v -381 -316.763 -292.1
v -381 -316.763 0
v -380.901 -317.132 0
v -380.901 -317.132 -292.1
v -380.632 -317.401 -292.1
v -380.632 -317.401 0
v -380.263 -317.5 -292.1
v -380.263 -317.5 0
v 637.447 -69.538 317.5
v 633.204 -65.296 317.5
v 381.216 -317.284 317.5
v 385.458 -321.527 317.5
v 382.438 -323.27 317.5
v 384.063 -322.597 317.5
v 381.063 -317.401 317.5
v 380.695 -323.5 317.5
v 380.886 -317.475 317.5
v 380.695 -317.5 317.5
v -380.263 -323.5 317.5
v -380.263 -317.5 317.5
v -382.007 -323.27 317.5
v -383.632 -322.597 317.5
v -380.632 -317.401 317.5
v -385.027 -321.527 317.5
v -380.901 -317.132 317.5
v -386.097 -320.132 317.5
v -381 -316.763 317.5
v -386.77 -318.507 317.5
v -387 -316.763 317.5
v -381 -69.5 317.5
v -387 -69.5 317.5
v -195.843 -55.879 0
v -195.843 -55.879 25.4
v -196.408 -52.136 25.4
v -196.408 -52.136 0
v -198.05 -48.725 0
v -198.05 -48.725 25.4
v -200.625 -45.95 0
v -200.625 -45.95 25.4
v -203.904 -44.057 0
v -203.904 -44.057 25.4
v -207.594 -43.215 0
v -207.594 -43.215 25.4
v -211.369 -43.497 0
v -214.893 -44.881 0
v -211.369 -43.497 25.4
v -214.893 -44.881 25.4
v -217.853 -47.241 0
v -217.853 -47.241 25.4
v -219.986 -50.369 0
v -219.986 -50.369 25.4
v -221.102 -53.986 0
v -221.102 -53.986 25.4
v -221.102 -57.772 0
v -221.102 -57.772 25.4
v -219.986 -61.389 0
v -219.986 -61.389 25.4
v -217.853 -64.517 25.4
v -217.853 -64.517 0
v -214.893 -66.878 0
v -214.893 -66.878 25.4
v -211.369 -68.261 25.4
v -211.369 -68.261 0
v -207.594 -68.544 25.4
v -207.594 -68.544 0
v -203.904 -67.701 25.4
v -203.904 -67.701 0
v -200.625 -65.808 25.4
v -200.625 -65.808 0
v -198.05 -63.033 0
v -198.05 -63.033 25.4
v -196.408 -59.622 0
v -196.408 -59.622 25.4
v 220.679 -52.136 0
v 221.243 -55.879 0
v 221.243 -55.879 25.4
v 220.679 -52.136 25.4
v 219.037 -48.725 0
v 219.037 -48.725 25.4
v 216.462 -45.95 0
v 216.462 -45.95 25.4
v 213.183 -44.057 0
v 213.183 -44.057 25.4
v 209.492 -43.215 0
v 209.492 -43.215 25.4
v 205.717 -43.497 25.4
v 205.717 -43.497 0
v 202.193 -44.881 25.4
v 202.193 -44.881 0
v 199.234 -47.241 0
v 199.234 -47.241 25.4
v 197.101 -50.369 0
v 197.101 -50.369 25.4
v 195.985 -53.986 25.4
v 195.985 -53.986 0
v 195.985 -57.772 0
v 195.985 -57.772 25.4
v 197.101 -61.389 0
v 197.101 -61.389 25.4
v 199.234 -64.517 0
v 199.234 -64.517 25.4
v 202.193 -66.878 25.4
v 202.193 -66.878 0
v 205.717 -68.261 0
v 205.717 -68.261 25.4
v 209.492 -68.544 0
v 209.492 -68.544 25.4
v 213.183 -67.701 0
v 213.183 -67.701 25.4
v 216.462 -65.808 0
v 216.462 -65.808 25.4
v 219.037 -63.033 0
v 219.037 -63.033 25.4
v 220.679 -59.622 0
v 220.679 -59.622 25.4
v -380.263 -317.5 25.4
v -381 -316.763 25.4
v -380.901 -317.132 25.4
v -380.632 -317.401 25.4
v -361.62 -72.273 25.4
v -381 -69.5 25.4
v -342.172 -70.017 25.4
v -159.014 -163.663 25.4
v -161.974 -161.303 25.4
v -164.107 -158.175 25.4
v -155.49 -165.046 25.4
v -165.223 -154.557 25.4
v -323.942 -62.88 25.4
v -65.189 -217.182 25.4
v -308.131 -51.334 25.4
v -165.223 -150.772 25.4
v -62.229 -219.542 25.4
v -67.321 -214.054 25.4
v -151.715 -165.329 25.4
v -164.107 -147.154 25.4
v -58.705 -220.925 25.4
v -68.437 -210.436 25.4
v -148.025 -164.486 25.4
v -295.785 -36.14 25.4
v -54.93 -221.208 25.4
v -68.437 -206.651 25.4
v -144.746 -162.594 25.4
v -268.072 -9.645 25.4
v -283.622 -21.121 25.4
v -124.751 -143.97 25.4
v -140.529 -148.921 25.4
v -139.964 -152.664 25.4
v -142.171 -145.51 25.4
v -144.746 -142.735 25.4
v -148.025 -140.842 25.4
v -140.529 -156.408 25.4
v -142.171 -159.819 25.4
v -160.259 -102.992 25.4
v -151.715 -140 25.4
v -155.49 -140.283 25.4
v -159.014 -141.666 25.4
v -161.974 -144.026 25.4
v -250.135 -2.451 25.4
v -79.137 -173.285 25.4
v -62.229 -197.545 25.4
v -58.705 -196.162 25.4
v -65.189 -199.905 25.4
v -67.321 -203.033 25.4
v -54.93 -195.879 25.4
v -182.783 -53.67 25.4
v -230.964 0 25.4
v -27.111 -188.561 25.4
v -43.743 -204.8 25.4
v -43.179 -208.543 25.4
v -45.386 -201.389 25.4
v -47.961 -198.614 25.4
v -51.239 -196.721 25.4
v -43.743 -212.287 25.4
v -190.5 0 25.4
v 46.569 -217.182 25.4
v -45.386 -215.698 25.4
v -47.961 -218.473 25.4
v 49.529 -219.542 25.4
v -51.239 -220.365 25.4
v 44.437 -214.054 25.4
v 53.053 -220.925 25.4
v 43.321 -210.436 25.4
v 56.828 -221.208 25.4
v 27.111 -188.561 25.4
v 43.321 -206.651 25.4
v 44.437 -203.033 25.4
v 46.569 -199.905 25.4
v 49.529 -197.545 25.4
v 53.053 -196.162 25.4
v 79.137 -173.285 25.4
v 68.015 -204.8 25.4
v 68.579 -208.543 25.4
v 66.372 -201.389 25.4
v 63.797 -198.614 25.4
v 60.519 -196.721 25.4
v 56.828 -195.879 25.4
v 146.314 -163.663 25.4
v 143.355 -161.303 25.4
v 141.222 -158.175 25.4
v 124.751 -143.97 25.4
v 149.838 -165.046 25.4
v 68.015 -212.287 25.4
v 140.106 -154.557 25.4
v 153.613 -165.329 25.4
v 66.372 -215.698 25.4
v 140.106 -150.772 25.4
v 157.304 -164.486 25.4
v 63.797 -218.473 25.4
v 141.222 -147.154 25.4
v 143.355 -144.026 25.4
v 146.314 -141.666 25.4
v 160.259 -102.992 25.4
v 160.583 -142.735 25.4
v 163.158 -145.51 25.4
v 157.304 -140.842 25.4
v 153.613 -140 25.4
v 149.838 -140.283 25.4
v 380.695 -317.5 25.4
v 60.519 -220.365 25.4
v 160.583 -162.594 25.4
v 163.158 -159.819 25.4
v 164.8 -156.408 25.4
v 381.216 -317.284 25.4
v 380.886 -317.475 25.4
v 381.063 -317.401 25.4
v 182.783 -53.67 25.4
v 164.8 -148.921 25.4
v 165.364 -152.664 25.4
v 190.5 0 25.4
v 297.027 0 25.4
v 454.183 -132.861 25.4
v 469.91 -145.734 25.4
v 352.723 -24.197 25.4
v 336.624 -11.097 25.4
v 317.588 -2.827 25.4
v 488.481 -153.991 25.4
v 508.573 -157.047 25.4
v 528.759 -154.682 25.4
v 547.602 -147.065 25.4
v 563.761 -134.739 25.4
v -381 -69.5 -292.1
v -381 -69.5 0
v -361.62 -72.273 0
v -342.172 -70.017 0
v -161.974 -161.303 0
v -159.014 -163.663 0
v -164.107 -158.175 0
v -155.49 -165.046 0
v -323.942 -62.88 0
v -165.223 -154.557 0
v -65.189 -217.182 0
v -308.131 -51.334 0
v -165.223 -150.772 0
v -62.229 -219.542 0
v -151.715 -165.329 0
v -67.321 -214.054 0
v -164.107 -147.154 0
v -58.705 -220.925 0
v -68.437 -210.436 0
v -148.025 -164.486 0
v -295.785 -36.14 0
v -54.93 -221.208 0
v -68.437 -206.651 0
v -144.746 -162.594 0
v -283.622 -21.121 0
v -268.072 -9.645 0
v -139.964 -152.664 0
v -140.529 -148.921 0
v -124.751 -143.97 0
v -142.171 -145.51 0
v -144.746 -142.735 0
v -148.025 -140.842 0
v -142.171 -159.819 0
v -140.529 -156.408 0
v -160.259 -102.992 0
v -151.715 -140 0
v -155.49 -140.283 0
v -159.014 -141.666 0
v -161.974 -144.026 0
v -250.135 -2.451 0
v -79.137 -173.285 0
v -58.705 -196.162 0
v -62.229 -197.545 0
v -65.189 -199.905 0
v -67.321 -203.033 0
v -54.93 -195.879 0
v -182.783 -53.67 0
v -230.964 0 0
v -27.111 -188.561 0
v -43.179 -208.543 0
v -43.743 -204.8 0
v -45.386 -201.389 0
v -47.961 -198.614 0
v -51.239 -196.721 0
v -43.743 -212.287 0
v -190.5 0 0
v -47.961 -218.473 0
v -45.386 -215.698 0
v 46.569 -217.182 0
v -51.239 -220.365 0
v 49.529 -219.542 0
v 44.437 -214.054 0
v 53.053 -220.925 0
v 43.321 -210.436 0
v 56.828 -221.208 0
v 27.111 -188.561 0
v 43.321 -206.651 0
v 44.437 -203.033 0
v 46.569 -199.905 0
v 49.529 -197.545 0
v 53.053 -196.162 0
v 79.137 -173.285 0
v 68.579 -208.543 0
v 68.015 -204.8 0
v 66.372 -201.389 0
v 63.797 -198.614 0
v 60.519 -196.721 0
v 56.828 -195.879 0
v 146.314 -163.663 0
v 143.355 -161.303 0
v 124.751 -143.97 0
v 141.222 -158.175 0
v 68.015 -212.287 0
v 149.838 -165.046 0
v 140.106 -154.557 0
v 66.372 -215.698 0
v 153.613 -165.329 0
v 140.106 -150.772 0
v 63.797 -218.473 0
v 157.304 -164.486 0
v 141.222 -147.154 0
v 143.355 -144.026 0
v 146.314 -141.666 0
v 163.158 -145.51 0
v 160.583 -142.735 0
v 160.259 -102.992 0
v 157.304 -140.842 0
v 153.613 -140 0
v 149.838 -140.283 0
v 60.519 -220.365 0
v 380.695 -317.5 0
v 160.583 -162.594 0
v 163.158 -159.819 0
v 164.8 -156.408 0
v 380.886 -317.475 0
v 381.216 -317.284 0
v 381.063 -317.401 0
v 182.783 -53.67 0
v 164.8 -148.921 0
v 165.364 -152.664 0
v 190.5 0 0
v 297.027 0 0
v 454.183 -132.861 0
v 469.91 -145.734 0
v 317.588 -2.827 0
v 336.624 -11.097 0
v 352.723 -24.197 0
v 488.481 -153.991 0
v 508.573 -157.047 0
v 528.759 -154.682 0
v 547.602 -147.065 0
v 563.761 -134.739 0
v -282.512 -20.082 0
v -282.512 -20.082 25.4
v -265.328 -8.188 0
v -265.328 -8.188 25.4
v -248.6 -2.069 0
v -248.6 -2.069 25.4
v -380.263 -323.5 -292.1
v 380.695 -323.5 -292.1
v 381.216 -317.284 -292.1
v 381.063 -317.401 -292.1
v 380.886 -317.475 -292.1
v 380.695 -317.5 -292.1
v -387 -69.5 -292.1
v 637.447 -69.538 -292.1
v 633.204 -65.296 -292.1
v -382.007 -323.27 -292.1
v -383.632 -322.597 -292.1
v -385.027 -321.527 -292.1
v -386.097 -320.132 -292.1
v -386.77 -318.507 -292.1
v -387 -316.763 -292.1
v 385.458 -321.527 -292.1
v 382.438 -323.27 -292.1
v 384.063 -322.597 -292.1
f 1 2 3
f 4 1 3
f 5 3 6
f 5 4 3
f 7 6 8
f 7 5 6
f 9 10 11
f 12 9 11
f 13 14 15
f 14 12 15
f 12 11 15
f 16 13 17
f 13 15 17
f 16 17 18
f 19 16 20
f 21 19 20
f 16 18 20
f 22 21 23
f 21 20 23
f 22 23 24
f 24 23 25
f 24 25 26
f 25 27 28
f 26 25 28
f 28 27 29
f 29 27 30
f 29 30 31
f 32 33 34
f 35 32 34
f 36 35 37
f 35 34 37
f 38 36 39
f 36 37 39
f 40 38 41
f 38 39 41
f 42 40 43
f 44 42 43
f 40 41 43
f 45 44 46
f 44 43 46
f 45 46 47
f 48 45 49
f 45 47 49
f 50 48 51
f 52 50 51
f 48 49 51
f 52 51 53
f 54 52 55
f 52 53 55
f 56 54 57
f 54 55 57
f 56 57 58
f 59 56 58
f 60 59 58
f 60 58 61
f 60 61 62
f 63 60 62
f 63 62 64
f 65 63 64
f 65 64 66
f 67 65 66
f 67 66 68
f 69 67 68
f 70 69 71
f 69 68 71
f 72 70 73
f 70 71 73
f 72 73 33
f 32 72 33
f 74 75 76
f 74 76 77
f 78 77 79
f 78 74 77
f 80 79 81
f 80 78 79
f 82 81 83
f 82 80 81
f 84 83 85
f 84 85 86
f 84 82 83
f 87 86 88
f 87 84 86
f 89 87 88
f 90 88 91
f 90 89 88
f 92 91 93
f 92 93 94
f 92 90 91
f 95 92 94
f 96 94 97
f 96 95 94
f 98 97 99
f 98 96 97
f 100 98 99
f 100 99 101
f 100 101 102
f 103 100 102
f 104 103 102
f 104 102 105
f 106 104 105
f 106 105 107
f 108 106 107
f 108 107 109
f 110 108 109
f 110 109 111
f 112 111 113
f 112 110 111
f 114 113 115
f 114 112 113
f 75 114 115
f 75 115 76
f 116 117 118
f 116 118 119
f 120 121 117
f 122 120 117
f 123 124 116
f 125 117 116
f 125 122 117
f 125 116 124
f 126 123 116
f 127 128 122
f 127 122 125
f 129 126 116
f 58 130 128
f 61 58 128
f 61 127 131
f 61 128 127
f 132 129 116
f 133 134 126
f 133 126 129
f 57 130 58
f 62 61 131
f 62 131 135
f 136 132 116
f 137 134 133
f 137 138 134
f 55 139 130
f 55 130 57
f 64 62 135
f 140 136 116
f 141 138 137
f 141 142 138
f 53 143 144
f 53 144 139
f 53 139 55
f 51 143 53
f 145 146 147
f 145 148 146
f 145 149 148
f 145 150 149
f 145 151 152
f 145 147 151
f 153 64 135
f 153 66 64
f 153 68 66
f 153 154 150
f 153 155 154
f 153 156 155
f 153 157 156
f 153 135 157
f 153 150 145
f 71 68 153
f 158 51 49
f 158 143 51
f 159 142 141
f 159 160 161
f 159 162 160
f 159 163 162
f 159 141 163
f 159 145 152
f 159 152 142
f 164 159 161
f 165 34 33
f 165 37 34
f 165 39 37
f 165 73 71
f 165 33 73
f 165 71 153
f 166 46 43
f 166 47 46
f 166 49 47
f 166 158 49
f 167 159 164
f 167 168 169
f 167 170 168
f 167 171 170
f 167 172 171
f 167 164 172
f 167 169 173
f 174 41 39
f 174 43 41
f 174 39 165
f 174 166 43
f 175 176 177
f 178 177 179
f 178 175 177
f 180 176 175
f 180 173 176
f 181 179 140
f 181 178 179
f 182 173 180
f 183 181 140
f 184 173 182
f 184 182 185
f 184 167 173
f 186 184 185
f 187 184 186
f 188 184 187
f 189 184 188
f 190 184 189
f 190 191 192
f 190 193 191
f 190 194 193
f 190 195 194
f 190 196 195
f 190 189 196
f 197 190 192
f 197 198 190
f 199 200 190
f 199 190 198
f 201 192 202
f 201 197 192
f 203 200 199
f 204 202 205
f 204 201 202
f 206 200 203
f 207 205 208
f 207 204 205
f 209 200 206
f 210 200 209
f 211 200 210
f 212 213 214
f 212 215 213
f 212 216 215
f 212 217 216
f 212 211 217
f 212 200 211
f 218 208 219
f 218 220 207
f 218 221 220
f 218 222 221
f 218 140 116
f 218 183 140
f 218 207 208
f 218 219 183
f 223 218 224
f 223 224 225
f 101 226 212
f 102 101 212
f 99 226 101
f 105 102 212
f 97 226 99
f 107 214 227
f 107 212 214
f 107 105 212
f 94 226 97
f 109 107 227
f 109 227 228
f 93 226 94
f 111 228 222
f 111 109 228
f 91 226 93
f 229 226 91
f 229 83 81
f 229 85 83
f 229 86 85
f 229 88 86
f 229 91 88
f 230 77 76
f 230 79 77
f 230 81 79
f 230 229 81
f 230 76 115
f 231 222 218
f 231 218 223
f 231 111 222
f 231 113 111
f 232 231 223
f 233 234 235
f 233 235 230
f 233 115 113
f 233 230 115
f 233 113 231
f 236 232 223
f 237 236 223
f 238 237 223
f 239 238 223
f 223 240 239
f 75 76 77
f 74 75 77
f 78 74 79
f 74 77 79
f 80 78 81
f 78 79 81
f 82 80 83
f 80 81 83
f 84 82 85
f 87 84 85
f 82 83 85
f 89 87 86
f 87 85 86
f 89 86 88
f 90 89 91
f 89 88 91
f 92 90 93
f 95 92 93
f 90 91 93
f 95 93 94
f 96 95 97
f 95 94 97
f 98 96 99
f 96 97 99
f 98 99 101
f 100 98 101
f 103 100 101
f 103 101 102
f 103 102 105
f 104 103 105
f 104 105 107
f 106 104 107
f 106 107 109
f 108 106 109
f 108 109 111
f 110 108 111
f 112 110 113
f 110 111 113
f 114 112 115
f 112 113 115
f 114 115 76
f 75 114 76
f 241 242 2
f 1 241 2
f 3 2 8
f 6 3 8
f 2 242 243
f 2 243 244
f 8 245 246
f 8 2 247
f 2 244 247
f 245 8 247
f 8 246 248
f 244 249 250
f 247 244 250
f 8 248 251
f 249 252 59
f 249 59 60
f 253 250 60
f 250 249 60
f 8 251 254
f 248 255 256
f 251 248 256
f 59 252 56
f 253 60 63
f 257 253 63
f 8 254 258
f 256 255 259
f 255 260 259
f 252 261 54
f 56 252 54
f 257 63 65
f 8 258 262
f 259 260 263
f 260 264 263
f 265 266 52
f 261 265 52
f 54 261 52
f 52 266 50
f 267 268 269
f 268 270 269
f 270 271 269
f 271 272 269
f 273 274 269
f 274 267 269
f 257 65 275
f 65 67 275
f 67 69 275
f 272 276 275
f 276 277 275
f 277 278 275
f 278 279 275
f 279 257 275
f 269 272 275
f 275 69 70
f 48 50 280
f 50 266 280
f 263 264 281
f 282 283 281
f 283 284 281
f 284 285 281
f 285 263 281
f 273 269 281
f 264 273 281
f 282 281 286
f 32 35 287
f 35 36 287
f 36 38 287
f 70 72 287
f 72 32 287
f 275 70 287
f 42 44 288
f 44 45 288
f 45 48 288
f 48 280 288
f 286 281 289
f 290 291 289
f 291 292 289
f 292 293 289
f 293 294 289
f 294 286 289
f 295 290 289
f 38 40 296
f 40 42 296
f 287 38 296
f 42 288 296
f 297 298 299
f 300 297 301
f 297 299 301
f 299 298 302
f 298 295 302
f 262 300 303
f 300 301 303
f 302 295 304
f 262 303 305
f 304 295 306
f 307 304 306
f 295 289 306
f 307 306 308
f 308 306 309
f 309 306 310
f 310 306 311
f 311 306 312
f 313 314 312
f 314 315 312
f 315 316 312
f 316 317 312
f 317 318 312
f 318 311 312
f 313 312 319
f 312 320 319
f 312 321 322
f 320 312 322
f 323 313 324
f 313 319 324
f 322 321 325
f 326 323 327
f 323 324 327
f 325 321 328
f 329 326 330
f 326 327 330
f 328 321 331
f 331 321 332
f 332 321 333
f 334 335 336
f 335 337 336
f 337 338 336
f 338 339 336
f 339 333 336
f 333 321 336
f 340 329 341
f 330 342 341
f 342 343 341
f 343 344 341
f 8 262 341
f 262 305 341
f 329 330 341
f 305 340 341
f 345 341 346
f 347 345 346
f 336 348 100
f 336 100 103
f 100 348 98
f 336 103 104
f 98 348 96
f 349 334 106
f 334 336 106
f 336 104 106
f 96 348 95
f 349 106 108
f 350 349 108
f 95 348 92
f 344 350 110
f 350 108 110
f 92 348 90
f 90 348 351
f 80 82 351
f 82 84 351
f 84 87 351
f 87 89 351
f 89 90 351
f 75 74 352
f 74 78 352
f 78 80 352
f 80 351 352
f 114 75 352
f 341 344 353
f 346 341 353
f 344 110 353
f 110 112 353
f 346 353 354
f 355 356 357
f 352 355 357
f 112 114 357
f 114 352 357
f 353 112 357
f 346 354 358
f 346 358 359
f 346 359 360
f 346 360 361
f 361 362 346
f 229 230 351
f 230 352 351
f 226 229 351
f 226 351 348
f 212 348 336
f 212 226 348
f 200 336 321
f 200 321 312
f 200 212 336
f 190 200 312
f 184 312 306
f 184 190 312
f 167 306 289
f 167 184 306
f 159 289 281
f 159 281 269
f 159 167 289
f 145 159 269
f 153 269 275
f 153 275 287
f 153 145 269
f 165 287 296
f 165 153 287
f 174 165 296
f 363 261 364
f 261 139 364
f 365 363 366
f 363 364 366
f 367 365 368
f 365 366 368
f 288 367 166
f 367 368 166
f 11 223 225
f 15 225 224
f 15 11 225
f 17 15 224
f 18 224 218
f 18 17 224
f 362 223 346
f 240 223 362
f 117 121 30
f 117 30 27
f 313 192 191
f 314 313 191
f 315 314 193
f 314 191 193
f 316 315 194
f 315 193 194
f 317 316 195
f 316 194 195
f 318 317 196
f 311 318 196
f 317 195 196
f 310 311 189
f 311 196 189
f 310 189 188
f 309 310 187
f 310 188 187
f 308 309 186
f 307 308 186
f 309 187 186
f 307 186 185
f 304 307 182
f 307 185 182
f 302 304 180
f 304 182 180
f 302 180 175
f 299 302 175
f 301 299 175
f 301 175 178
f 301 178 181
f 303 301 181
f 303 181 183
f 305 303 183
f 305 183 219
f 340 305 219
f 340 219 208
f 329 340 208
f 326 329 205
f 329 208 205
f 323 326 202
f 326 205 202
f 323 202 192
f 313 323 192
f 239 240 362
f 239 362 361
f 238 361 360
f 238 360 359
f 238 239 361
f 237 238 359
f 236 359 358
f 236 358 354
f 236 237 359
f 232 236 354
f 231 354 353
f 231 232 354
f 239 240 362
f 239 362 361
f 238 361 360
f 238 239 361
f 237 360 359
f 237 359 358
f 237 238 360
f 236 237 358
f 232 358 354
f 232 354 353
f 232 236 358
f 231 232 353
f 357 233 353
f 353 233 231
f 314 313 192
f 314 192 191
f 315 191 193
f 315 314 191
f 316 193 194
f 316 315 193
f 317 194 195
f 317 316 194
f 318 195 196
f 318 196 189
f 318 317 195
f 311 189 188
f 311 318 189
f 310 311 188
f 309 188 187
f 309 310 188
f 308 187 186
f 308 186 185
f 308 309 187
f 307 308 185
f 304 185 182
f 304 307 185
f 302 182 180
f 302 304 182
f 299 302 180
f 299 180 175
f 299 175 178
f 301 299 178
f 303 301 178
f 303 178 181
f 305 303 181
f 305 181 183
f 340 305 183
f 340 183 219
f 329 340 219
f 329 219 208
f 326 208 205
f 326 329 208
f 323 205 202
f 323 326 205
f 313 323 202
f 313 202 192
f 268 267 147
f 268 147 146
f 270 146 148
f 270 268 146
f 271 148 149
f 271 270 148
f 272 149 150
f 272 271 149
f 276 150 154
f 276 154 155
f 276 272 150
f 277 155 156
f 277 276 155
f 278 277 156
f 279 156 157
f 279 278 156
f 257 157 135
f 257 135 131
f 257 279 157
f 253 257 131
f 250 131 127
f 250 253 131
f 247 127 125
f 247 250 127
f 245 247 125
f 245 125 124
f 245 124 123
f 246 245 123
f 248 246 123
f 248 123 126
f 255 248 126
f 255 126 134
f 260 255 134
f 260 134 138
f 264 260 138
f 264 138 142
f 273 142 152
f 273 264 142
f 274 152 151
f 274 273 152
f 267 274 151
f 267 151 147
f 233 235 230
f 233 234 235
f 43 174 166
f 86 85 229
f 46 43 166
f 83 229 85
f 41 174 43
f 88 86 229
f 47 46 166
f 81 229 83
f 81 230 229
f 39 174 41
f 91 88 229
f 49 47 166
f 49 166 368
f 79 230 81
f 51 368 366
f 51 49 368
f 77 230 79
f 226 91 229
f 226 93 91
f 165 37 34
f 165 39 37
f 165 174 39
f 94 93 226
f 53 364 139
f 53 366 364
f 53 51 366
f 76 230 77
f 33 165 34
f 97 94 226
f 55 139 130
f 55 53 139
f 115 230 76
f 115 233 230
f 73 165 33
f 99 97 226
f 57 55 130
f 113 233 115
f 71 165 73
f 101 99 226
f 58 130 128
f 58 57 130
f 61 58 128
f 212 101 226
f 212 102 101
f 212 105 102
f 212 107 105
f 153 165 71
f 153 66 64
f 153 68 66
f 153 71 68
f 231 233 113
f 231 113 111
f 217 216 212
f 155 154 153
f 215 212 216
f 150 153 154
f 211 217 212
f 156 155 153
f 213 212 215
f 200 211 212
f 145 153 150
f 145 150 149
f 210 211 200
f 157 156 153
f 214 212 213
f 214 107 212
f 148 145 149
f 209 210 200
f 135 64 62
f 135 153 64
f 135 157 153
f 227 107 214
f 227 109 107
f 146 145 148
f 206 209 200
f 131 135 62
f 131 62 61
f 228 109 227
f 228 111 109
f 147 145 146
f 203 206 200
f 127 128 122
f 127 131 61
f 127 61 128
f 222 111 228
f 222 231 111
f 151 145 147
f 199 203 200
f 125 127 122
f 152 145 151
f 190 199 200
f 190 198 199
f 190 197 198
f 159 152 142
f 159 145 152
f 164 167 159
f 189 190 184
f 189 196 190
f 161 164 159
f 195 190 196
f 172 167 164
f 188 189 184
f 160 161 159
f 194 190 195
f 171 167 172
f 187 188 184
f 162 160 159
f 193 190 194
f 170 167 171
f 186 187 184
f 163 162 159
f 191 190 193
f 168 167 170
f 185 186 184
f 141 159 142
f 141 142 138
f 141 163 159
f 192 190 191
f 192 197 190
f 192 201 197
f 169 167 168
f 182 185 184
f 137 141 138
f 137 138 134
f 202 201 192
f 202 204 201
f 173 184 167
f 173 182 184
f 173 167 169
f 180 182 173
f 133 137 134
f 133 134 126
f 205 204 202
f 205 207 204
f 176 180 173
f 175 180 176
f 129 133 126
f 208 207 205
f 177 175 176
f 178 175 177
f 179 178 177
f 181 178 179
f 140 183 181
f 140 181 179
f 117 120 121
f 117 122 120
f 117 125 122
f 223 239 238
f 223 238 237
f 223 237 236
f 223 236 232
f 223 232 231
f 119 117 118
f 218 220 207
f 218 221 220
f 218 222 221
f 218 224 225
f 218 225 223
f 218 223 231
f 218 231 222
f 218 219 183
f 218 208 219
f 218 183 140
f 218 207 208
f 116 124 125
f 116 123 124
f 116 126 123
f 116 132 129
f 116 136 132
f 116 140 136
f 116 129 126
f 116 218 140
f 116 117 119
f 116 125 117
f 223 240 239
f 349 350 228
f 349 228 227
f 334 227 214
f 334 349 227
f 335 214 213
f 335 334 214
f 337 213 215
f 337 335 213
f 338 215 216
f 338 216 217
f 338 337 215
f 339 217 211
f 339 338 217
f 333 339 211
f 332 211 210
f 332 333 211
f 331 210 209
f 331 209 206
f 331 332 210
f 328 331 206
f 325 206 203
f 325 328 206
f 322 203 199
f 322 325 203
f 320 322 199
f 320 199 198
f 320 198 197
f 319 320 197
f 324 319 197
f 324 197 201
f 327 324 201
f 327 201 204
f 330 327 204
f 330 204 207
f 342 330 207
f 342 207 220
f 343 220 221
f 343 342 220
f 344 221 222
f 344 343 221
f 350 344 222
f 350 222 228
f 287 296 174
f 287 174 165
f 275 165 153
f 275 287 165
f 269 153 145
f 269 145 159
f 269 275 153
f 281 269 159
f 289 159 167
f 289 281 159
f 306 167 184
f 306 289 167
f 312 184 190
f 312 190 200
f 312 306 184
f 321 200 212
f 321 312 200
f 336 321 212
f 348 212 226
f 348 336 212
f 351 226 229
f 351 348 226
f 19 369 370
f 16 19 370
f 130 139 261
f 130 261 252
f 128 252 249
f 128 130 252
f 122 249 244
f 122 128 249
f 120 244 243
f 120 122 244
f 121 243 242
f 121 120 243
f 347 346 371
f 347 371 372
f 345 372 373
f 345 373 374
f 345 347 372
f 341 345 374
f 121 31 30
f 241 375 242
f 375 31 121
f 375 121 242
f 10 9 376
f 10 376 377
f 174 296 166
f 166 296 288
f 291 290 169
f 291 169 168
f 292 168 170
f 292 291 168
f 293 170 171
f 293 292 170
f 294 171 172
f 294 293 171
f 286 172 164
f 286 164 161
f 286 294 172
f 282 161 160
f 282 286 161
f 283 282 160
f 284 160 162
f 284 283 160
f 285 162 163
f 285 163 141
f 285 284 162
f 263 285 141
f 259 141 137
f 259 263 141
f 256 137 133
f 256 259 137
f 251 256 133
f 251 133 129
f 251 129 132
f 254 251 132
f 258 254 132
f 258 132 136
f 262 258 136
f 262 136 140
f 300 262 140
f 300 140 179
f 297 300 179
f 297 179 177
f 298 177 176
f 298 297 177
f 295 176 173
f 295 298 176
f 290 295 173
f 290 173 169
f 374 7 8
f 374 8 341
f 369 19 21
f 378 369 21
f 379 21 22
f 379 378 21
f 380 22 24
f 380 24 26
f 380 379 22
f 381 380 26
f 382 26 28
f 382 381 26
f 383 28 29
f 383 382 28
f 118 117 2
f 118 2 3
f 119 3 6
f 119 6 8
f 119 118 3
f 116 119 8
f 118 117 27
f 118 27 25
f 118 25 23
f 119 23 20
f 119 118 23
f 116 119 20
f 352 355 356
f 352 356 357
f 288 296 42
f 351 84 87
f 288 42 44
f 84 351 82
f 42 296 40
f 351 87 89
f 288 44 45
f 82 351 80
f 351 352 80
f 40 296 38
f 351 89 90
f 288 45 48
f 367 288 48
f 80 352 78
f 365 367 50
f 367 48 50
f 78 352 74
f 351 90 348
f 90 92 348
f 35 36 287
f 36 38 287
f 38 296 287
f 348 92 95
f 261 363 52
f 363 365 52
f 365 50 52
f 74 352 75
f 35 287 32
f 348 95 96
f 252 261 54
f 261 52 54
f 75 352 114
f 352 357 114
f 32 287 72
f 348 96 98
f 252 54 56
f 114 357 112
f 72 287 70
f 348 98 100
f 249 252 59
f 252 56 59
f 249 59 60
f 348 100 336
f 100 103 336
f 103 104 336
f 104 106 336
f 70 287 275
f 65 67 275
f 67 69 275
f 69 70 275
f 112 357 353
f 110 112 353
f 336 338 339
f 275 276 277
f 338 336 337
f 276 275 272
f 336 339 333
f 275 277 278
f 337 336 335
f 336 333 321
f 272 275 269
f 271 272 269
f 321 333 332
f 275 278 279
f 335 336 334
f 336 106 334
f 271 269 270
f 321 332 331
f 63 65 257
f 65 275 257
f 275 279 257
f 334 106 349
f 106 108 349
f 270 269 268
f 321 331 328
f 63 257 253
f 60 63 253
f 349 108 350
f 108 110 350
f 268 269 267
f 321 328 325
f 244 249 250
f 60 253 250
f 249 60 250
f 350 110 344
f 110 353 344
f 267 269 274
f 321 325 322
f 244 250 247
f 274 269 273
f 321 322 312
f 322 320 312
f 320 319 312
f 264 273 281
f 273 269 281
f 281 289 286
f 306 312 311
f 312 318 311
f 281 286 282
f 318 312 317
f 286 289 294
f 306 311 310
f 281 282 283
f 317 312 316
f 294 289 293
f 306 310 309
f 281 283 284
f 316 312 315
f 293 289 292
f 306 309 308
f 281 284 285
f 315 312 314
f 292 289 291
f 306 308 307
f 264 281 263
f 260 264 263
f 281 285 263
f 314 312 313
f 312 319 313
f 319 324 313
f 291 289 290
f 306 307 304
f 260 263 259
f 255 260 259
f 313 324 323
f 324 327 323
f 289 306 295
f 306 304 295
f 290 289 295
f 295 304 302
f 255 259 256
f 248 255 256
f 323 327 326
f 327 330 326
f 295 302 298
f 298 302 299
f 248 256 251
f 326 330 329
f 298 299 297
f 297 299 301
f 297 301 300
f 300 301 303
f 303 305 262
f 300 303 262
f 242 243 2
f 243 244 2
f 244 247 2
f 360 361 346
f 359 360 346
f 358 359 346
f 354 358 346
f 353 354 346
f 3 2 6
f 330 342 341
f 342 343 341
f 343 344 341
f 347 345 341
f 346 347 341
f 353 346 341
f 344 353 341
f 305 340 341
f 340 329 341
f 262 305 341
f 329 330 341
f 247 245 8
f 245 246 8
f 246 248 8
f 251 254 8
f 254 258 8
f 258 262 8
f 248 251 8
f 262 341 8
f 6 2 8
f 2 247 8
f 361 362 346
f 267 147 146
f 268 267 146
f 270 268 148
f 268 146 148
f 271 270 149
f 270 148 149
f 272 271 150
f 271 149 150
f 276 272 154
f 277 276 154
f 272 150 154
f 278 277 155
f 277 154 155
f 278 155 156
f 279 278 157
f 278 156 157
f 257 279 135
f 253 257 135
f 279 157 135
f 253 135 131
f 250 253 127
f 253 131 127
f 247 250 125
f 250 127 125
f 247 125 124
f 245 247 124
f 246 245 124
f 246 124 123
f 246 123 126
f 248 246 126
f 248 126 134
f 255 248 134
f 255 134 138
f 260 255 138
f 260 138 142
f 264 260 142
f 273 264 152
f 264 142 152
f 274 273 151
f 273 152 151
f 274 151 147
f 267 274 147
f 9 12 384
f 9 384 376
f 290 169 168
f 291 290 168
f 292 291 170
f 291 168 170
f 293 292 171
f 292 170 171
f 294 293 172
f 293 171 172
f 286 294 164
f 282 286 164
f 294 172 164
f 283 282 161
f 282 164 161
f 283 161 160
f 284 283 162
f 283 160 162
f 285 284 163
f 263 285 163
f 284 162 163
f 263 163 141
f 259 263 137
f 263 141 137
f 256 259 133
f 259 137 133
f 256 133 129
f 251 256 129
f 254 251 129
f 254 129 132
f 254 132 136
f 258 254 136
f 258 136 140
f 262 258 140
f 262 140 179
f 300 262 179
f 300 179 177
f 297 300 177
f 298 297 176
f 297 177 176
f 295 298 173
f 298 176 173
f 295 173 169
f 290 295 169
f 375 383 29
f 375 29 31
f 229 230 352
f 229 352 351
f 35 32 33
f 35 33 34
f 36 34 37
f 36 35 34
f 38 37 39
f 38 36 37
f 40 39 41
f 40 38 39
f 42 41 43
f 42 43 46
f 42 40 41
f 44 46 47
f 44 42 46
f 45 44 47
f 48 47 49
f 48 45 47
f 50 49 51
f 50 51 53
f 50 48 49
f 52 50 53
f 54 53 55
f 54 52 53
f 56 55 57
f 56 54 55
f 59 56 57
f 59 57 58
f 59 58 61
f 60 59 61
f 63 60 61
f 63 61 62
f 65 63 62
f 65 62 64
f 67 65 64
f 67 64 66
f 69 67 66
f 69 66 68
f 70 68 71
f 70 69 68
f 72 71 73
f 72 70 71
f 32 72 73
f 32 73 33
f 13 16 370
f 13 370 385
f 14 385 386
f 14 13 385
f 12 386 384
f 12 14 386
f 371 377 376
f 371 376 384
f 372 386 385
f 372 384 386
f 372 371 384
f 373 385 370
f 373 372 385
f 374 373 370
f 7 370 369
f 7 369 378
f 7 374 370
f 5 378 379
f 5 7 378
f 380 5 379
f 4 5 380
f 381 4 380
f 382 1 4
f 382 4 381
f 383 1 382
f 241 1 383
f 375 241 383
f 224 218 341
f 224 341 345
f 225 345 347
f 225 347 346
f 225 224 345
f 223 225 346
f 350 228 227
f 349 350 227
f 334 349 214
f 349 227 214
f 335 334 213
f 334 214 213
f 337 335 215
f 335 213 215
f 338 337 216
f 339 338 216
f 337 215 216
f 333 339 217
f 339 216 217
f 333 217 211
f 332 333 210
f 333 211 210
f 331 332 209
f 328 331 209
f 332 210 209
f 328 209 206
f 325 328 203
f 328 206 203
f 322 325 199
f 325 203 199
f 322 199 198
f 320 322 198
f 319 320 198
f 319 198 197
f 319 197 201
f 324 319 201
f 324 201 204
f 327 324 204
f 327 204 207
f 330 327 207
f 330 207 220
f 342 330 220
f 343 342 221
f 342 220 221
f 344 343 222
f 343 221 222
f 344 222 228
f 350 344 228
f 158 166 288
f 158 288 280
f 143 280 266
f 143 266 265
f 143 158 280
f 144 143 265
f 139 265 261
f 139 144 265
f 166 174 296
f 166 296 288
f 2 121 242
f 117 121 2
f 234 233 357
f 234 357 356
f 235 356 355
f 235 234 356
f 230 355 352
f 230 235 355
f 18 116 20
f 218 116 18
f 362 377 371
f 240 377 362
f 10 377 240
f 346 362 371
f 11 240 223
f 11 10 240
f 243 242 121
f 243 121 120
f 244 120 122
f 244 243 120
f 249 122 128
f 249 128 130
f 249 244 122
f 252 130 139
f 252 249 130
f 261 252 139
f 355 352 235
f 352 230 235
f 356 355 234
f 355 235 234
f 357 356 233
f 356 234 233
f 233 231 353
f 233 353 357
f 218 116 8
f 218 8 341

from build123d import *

# Parameters (mm, degrees)
SKETCH1_R                    = 241.3
SKETCH1_R_2                  = 190.5
SKETCH1_R_3                  = 12.7
BOSS_EXTRUDE1_DEPTH          = 25.4
SKETCH19_W                   = 762
SKETCH19_H                   = 609.6
BASE_FLANGE1_DEPTH           = 6
EDGE_FLANGE1_STRIP_CUT_DEPTH = 609.6
EDGE_FLANGE1_DEPTH           = 609.6
EDGE_FLANGE2_STRIP_W         = 25.4732
EDGE_FLANGE2_STRIP_H         = 6
EDGE_FLANGE2_STRIP_CUT_DEPTH = 609.6
EDGE_FLANGE2_DEPTH           = 609.6
BOSS_EXTRUDE2_DEPTH          = 12.7
BOSS_EXTRUDE2_DEPTH_BACK     = 12.7
FILLET1_R                    = 76.2
SKETCH30_R                   = 12.7
CUT_EXTRUDE1_DEPTH           = 783.174585068
FILLET3_R                    = 76.2
SKETCH31_R                   = 12.7
BOSS_EXTRUDE3_DEPTH          = 25.4


# Sheet-metal steps are written as plain solids
with BuildPart() as part:
    # Sketch1 → Boss-Extrude1 (new body)
    with BuildSketch(Plane.XY):
        Circle(SKETCH1_R)
        Circle(SKETCH1_R_2, mode=Mode.SUBTRACT)
        with Locations((55.879031838, 208.543385896)):
            Circle(SKETCH1_R_3, mode=Mode.SUBTRACT)
        with Locations((152.664354058, 152.664354058)):
            Circle(SKETCH1_R_3, mode=Mode.SUBTRACT)
        with Locations((208.543385896, 55.879031838)):
            Circle(SKETCH1_R_3, mode=Mode.SUBTRACT)
        with Locations((208.543385896, -55.879031838)):
            Circle(SKETCH1_R_3, mode=Mode.SUBTRACT)
        with Locations((152.664354058, -152.664354058)):
            Circle(SKETCH1_R_3, mode=Mode.SUBTRACT)
        with Locations((55.879031838, -208.543385896)):
            Circle(SKETCH1_R_3, mode=Mode.SUBTRACT)
        with Locations((-55.879031838, -208.543385896)):
            Circle(SKETCH1_R_3, mode=Mode.SUBTRACT)
        with Locations((-152.664354058, -152.664354058)):
            Circle(SKETCH1_R_3, mode=Mode.SUBTRACT)
        with Locations((-208.543385896, -55.879031838)):
            Circle(SKETCH1_R_3, mode=Mode.SUBTRACT)
        with Locations((-208.543385896, 55.879031838)):
            Circle(SKETCH1_R_3, mode=Mode.SUBTRACT)
        with Locations((-152.664354058, 152.664354058)):
            Circle(SKETCH1_R_3, mode=Mode.SUBTRACT)
        with Locations((-55.879031838, 208.543385896)):
            Circle(SKETCH1_R_3, mode=Mode.SUBTRACT)
    extrude(amount=BOSS_EXTRUDE1_DEPTH)



with BuildPart() as body_2:
    # Sketch19 → Base-Flange1 (new body)
    with BuildSketch(Plane(origin=(0, -317.5, 0), x_dir=(1, 0, 0), z_dir=(0, 1, 0))):
        with Locations((0, -12.7)):
            Rectangle(SKETCH19_W, SKETCH19_H)
    extrude(amount=-BASE_FLANGE1_DEPTH)

    # Edge-Flange1 strip (across the edge) → Edge-Flange1 strip cut (cut)
    with BuildSketch(Plane(origin=(381, -317.5, 317.5), x_dir=(-0.7071067811865438, 0.7071067811865512, 0), z_dir=(0, 0, -1))):
        Polygon((-22.039168001, 13.553886626), (-4.026895542, -4.458385832), (0.215745145, -0.215745145), (-17.796527314, 17.796527314), align=None)
    extrude(amount=EDGE_FLANGE1_STRIP_CUT_DEPTH, mode=Mode.SUBTRACT)

    # Edge-Flange1 section (across the edge) → Edge-Flange1 (add)
    with BuildSketch(Plane(origin=(381, -317.5, 317.5), x_dir=(-0.7071067811865438, 0.7071067811865512, 0), z_dir=(0, 0, -1))):
        with BuildLine():
            Line((-6, 0.30510971), (-6, 356.670718626))
            Line((-6, 356.670718626), (0, 356.670718626))
            Line((0, 356.670718626), (0, 0.30510971))
            ThreePointArc((0, 0.30510971), (0.056070336, 0.023225094), (0.215745145, -0.215745145))
            Line((0.215745145, -0.215745145), (-4.026895542, -4.458385832))
            ThreePointArc((-4.026895542, -4.458385832), (-5.487206859, -2.2728755), (-6, 0.30510971))
        make_face()
    extrude(amount=EDGE_FLANGE1_DEPTH)

    # Edge-Flange2 strip (across the edge) → Edge-Flange2 strip cut (cut)
    with BuildSketch(Plane(origin=(-381, -317.5, -292.1), x_dir=(1, 0, 0), z_dir=(0, 0, 1))):
        with Locations((-12, -3)):
            Rectangle(EDGE_FLANGE2_STRIP_W, EDGE_FLANGE2_STRIP_H)
    extrude(amount=EDGE_FLANGE2_STRIP_CUT_DEPTH, mode=Mode.SUBTRACT)

    # Edge-Flange2 section (across the edge) → Edge-Flange2 (add)
    with BuildSketch(Plane(origin=(-381, -317.5, -292.1), x_dir=(1, 0, 0), z_dir=(0, 0, 1))):
        with BuildLine():
            Line((-6, 0.7366), (-6, 248))
            Line((-6, 248), (0, 248))
            Line((0, 248), (0, 0.7366))
            ThreePointArc((0, 0.7366), (0.215745145, 0.215745145), (0.7366, 0))
            Line((0.7366, 0), (0.7366, -6))
            ThreePointArc((0.7366, -6), (-4.026895542, -4.026895542), (-6, 0.7366))
        make_face()
    extrude(amount=EDGE_FLANGE2_DEPTH)


with BuildPart() as part_1:
    add(part.part)

    add(body_2.part)  # Boss-Extrude2 merges body 2
    # Sketch2 → Boss-Extrude2 (add, two sides: drawn at the far end of the back side and taken through both)
    with BuildSketch(Plane(origin=(0, 0, 12.7), x_dir=(-1, 0, 0), z_dir=(0, 0, -1)).offset(-BOSS_EXTRUDE2_DEPTH_BACK)):
        with BuildLine():
            Line((-176.371629871, 164.677679655), (-508, -190.5))
            Line((-508, -190.5), (-381, -317.5))
            Line((-381, -317.5), (381, -317.5))
            Line((381, -317.5), (381, -190.5))
            Line((381, -190.5), (211.187529283, 116.728391899))
            ThreePointArc((211.187529283, 116.728391899), (-29.628031694, -239.474152547), (-176.371629871, 164.677679655))
        make_face()
    extrude(amount=BOSS_EXTRUDE2_DEPTH + BOSS_EXTRUDE2_DEPTH_BACK)

    # Fillet1
    # the kernel refuses this fillet: 76.2 mm, written as the material it adds along each edge
    with BuildSketch(Plane(origin=(-381, -190.5, 0), x_dir=(0, 1, 0), z_dir=(0, 0, 1))) as fillet1_piece_1:
        with BuildLine():
            CenterArc((194.419807723, -20.395387566), FILLET1_R, 164.475167034, 76.594355804)
            Line((157.558210281, -87.086186287), (156.820978332, -88.420002261))
            Line((156.820978332, -88.420002261), (-0.737231949, -1.333815974))
            Line((-0.737231949, -1.333815974), (0, 1.524))
            ThreePointArc((0, 1.524), (60.5, 1.524), (119.531603846, 0.407907751))
            Line((119.531603846, 0.407907751), (121, 0))
        make_face()
    extrude(amount=25.4)
    with BuildSketch(Plane(origin=(508, -190.5, 25.4), x_dir=(0.7071067811865509, 0.707106781186544, 0), z_dir=(0, 0, -1))) as fillet1_piece_2:
        with BuildLine():
            CenterArc((FILLET1_R * 1.03487581695, -FILLET1_R), FILLET1_R, 90, 91.963796982)
            Line((FILLET1_R * 0.0354631377737, -FILLET1_R * 1.03426801283), (FILLET1_R * 0.0154748841901, -FILLET1_R * 1.03495337309))
            Line((FILLET1_R * 0.0154748841901, -FILLET1_R * 1.03495337309), (-FILLET1_R * 0.020697516339, FILLET1_R * 0.02))
            Line((-FILLET1_R * 0.020697516339, FILLET1_R * 0.02), (FILLET1_R * 1.03487581695, FILLET1_R * 0.02))
            Line((FILLET1_R * 1.03487581695, FILLET1_R * 0.02), (FILLET1_R * 1.03487581695, 0))
        make_face()
    extrude(amount=25.4)

    # Sketch30 → Cut-Extrude1 (cut, through all)
    # profile 1 of 3: a face of its own
    with BuildSketch(Plane(origin=(0, 0, 0), x_dir=(-1, 0, 0), z_dir=(0, 0, -1))):
        with BuildLine():
            Line((-330.130702101, 0), (-241.3, 0))
            ThreePointArc((-241.3, 0), (-224.481808047, 88.507671171), (-176.371629871, 164.677679655))
            Line((-176.371629871, 164.677679655), (-330.130702101, 0))
        make_face()
    # profile 2 of 3: a face of its own
    with BuildSketch(Plane(origin=(0, 0, 0), x_dir=(-1, 0, 0), z_dir=(0, 0, -1))):
        with BuildLine():
            Line((-241.3, 0), (-190.5, 0))
            ThreePointArc((-190.5, 0), (0, 190.5), (190.5, 0))
            Line((190.5, 0), (241.3, 0))
            ThreePointArc((241.3, 0), (233.650637508, 60.274949954), (211.187529283, 116.728391899))
            ThreePointArc((211.187529283, 116.728391899), (29.628031694, 239.474152547), (-176.371629871, 164.677679655))
            ThreePointArc((-176.371629871, 164.677679655), (-224.481808047, 88.507671171), (-241.3, 0))
        make_face()
        with Locations((-208.543385896, 55.879031838)):
            Circle(SKETCH30_R, mode=Mode.SUBTRACT)
        with Locations((-152.664354058, 152.664354058)):
            Circle(SKETCH30_R, mode=Mode.SUBTRACT)
        with Locations((-55.879031838, 208.543385896)):
            Circle(SKETCH30_R, mode=Mode.SUBTRACT)
        with Locations((208.543385896, 55.879031838)):
            Circle(SKETCH30_R, mode=Mode.SUBTRACT)
        with Locations((55.879031838, 208.543385896)):
            Circle(SKETCH30_R, mode=Mode.SUBTRACT)
        with Locations((152.664354058, 152.664354058)):
            Circle(SKETCH30_R, mode=Mode.SUBTRACT)
    # profile 3 of 3: a face of its own
    with BuildSketch(Plane(origin=(0, 0, 0), x_dir=(-1, 0, 0), z_dir=(0, 0, -1))):
        with BuildLine():
            ThreePointArc((211.187529283, 116.728391899), (233.650637508, 60.274949954), (241.3, 0))
            Line((241.3, 0), (275.706099682, 0))
            Line((275.706099682, 0), (211.187529283, 116.728391899))
        make_face()
    extrude(amount=-CUT_EXTRUDE1_DEPTH, mode=Mode.SUBTRACT)

    # Fillet3
    fillet3_edges = [part_1.edges().sort_by_distance(p)[0] for p in [
        (-275.706099682, 0, 12.7),
        (330.130702101, 0, 12.7),
    ]]
    fillet(fillet3_edges, radius=FILLET3_R)


with BuildPart() as body_2_2:
    # Sketch31 → Boss-Extrude3 (new body)
    with BuildSketch(Plane.XY.offset(25.4)):
        with BuildLine():
            Line((-190.5, 0), (-230.964431894, 0))
            ThreePointArc((-230.964431894, 0), (-268.071542572, -9.645493488), (-295.784522164, -36.140096139))
            ThreePointArc((-295.784522164, -36.140096139), (-332.826755263, -67.036732857), (-381, -69.5))
            Line((-381, -69.5), (-381, -316.7634))
            ThreePointArc((-381, -316.7634), (-380.784254855, -317.284254855), (-380.2634, -317.5))
            Line((-380.2634, -317.5), (380.69489029, -317.5))
            ThreePointArc((380.69489029, -317.5), (380.976774906, -317.443929664), (381.215745145, -317.284254855))
            Line((381.215745145, -317.284254855), (563.760699338, -134.739300662))
            ThreePointArc((563.760699338, -134.739300662), (508.573359578, -157.046574652), (454.182858442, -132.861241721))
            Line((454.182858442, -132.861241721), (352.722924767, -24.196522214))
            ThreePointArc((352.722924767, -24.196522214), (327.389220887, -6.31042636), (297.026620597, 0))
            Line((297.026620597, 0), (190.5, 0))
            ThreePointArc((190.5, 0), (0, -190.5), (-190.5, 0))
        make_face()
        with Locations((208.543385896, -55.879031838)):
            Circle(SKETCH31_R, mode=Mode.SUBTRACT)
        with Locations((152.664354058, -152.664354058)):
            Circle(SKETCH31_R, mode=Mode.SUBTRACT)
        with Locations((55.879031838, -208.543385896)):
            Circle(SKETCH31_R, mode=Mode.SUBTRACT)
        with Locations((-55.879031838, -208.543385896)):
            Circle(SKETCH31_R, mode=Mode.SUBTRACT)
        with Locations((-152.664354058, -152.664354058)):
            Circle(SKETCH31_R, mode=Mode.SUBTRACT)
        with Locations((-208.543385896, -55.879031838)):
            Circle(SKETCH31_R, mode=Mode.SUBTRACT)
    extrude(amount=-BOSS_EXTRUDE3_DEPTH)


solid = Compound([part_1.part, body_2_2.part])
